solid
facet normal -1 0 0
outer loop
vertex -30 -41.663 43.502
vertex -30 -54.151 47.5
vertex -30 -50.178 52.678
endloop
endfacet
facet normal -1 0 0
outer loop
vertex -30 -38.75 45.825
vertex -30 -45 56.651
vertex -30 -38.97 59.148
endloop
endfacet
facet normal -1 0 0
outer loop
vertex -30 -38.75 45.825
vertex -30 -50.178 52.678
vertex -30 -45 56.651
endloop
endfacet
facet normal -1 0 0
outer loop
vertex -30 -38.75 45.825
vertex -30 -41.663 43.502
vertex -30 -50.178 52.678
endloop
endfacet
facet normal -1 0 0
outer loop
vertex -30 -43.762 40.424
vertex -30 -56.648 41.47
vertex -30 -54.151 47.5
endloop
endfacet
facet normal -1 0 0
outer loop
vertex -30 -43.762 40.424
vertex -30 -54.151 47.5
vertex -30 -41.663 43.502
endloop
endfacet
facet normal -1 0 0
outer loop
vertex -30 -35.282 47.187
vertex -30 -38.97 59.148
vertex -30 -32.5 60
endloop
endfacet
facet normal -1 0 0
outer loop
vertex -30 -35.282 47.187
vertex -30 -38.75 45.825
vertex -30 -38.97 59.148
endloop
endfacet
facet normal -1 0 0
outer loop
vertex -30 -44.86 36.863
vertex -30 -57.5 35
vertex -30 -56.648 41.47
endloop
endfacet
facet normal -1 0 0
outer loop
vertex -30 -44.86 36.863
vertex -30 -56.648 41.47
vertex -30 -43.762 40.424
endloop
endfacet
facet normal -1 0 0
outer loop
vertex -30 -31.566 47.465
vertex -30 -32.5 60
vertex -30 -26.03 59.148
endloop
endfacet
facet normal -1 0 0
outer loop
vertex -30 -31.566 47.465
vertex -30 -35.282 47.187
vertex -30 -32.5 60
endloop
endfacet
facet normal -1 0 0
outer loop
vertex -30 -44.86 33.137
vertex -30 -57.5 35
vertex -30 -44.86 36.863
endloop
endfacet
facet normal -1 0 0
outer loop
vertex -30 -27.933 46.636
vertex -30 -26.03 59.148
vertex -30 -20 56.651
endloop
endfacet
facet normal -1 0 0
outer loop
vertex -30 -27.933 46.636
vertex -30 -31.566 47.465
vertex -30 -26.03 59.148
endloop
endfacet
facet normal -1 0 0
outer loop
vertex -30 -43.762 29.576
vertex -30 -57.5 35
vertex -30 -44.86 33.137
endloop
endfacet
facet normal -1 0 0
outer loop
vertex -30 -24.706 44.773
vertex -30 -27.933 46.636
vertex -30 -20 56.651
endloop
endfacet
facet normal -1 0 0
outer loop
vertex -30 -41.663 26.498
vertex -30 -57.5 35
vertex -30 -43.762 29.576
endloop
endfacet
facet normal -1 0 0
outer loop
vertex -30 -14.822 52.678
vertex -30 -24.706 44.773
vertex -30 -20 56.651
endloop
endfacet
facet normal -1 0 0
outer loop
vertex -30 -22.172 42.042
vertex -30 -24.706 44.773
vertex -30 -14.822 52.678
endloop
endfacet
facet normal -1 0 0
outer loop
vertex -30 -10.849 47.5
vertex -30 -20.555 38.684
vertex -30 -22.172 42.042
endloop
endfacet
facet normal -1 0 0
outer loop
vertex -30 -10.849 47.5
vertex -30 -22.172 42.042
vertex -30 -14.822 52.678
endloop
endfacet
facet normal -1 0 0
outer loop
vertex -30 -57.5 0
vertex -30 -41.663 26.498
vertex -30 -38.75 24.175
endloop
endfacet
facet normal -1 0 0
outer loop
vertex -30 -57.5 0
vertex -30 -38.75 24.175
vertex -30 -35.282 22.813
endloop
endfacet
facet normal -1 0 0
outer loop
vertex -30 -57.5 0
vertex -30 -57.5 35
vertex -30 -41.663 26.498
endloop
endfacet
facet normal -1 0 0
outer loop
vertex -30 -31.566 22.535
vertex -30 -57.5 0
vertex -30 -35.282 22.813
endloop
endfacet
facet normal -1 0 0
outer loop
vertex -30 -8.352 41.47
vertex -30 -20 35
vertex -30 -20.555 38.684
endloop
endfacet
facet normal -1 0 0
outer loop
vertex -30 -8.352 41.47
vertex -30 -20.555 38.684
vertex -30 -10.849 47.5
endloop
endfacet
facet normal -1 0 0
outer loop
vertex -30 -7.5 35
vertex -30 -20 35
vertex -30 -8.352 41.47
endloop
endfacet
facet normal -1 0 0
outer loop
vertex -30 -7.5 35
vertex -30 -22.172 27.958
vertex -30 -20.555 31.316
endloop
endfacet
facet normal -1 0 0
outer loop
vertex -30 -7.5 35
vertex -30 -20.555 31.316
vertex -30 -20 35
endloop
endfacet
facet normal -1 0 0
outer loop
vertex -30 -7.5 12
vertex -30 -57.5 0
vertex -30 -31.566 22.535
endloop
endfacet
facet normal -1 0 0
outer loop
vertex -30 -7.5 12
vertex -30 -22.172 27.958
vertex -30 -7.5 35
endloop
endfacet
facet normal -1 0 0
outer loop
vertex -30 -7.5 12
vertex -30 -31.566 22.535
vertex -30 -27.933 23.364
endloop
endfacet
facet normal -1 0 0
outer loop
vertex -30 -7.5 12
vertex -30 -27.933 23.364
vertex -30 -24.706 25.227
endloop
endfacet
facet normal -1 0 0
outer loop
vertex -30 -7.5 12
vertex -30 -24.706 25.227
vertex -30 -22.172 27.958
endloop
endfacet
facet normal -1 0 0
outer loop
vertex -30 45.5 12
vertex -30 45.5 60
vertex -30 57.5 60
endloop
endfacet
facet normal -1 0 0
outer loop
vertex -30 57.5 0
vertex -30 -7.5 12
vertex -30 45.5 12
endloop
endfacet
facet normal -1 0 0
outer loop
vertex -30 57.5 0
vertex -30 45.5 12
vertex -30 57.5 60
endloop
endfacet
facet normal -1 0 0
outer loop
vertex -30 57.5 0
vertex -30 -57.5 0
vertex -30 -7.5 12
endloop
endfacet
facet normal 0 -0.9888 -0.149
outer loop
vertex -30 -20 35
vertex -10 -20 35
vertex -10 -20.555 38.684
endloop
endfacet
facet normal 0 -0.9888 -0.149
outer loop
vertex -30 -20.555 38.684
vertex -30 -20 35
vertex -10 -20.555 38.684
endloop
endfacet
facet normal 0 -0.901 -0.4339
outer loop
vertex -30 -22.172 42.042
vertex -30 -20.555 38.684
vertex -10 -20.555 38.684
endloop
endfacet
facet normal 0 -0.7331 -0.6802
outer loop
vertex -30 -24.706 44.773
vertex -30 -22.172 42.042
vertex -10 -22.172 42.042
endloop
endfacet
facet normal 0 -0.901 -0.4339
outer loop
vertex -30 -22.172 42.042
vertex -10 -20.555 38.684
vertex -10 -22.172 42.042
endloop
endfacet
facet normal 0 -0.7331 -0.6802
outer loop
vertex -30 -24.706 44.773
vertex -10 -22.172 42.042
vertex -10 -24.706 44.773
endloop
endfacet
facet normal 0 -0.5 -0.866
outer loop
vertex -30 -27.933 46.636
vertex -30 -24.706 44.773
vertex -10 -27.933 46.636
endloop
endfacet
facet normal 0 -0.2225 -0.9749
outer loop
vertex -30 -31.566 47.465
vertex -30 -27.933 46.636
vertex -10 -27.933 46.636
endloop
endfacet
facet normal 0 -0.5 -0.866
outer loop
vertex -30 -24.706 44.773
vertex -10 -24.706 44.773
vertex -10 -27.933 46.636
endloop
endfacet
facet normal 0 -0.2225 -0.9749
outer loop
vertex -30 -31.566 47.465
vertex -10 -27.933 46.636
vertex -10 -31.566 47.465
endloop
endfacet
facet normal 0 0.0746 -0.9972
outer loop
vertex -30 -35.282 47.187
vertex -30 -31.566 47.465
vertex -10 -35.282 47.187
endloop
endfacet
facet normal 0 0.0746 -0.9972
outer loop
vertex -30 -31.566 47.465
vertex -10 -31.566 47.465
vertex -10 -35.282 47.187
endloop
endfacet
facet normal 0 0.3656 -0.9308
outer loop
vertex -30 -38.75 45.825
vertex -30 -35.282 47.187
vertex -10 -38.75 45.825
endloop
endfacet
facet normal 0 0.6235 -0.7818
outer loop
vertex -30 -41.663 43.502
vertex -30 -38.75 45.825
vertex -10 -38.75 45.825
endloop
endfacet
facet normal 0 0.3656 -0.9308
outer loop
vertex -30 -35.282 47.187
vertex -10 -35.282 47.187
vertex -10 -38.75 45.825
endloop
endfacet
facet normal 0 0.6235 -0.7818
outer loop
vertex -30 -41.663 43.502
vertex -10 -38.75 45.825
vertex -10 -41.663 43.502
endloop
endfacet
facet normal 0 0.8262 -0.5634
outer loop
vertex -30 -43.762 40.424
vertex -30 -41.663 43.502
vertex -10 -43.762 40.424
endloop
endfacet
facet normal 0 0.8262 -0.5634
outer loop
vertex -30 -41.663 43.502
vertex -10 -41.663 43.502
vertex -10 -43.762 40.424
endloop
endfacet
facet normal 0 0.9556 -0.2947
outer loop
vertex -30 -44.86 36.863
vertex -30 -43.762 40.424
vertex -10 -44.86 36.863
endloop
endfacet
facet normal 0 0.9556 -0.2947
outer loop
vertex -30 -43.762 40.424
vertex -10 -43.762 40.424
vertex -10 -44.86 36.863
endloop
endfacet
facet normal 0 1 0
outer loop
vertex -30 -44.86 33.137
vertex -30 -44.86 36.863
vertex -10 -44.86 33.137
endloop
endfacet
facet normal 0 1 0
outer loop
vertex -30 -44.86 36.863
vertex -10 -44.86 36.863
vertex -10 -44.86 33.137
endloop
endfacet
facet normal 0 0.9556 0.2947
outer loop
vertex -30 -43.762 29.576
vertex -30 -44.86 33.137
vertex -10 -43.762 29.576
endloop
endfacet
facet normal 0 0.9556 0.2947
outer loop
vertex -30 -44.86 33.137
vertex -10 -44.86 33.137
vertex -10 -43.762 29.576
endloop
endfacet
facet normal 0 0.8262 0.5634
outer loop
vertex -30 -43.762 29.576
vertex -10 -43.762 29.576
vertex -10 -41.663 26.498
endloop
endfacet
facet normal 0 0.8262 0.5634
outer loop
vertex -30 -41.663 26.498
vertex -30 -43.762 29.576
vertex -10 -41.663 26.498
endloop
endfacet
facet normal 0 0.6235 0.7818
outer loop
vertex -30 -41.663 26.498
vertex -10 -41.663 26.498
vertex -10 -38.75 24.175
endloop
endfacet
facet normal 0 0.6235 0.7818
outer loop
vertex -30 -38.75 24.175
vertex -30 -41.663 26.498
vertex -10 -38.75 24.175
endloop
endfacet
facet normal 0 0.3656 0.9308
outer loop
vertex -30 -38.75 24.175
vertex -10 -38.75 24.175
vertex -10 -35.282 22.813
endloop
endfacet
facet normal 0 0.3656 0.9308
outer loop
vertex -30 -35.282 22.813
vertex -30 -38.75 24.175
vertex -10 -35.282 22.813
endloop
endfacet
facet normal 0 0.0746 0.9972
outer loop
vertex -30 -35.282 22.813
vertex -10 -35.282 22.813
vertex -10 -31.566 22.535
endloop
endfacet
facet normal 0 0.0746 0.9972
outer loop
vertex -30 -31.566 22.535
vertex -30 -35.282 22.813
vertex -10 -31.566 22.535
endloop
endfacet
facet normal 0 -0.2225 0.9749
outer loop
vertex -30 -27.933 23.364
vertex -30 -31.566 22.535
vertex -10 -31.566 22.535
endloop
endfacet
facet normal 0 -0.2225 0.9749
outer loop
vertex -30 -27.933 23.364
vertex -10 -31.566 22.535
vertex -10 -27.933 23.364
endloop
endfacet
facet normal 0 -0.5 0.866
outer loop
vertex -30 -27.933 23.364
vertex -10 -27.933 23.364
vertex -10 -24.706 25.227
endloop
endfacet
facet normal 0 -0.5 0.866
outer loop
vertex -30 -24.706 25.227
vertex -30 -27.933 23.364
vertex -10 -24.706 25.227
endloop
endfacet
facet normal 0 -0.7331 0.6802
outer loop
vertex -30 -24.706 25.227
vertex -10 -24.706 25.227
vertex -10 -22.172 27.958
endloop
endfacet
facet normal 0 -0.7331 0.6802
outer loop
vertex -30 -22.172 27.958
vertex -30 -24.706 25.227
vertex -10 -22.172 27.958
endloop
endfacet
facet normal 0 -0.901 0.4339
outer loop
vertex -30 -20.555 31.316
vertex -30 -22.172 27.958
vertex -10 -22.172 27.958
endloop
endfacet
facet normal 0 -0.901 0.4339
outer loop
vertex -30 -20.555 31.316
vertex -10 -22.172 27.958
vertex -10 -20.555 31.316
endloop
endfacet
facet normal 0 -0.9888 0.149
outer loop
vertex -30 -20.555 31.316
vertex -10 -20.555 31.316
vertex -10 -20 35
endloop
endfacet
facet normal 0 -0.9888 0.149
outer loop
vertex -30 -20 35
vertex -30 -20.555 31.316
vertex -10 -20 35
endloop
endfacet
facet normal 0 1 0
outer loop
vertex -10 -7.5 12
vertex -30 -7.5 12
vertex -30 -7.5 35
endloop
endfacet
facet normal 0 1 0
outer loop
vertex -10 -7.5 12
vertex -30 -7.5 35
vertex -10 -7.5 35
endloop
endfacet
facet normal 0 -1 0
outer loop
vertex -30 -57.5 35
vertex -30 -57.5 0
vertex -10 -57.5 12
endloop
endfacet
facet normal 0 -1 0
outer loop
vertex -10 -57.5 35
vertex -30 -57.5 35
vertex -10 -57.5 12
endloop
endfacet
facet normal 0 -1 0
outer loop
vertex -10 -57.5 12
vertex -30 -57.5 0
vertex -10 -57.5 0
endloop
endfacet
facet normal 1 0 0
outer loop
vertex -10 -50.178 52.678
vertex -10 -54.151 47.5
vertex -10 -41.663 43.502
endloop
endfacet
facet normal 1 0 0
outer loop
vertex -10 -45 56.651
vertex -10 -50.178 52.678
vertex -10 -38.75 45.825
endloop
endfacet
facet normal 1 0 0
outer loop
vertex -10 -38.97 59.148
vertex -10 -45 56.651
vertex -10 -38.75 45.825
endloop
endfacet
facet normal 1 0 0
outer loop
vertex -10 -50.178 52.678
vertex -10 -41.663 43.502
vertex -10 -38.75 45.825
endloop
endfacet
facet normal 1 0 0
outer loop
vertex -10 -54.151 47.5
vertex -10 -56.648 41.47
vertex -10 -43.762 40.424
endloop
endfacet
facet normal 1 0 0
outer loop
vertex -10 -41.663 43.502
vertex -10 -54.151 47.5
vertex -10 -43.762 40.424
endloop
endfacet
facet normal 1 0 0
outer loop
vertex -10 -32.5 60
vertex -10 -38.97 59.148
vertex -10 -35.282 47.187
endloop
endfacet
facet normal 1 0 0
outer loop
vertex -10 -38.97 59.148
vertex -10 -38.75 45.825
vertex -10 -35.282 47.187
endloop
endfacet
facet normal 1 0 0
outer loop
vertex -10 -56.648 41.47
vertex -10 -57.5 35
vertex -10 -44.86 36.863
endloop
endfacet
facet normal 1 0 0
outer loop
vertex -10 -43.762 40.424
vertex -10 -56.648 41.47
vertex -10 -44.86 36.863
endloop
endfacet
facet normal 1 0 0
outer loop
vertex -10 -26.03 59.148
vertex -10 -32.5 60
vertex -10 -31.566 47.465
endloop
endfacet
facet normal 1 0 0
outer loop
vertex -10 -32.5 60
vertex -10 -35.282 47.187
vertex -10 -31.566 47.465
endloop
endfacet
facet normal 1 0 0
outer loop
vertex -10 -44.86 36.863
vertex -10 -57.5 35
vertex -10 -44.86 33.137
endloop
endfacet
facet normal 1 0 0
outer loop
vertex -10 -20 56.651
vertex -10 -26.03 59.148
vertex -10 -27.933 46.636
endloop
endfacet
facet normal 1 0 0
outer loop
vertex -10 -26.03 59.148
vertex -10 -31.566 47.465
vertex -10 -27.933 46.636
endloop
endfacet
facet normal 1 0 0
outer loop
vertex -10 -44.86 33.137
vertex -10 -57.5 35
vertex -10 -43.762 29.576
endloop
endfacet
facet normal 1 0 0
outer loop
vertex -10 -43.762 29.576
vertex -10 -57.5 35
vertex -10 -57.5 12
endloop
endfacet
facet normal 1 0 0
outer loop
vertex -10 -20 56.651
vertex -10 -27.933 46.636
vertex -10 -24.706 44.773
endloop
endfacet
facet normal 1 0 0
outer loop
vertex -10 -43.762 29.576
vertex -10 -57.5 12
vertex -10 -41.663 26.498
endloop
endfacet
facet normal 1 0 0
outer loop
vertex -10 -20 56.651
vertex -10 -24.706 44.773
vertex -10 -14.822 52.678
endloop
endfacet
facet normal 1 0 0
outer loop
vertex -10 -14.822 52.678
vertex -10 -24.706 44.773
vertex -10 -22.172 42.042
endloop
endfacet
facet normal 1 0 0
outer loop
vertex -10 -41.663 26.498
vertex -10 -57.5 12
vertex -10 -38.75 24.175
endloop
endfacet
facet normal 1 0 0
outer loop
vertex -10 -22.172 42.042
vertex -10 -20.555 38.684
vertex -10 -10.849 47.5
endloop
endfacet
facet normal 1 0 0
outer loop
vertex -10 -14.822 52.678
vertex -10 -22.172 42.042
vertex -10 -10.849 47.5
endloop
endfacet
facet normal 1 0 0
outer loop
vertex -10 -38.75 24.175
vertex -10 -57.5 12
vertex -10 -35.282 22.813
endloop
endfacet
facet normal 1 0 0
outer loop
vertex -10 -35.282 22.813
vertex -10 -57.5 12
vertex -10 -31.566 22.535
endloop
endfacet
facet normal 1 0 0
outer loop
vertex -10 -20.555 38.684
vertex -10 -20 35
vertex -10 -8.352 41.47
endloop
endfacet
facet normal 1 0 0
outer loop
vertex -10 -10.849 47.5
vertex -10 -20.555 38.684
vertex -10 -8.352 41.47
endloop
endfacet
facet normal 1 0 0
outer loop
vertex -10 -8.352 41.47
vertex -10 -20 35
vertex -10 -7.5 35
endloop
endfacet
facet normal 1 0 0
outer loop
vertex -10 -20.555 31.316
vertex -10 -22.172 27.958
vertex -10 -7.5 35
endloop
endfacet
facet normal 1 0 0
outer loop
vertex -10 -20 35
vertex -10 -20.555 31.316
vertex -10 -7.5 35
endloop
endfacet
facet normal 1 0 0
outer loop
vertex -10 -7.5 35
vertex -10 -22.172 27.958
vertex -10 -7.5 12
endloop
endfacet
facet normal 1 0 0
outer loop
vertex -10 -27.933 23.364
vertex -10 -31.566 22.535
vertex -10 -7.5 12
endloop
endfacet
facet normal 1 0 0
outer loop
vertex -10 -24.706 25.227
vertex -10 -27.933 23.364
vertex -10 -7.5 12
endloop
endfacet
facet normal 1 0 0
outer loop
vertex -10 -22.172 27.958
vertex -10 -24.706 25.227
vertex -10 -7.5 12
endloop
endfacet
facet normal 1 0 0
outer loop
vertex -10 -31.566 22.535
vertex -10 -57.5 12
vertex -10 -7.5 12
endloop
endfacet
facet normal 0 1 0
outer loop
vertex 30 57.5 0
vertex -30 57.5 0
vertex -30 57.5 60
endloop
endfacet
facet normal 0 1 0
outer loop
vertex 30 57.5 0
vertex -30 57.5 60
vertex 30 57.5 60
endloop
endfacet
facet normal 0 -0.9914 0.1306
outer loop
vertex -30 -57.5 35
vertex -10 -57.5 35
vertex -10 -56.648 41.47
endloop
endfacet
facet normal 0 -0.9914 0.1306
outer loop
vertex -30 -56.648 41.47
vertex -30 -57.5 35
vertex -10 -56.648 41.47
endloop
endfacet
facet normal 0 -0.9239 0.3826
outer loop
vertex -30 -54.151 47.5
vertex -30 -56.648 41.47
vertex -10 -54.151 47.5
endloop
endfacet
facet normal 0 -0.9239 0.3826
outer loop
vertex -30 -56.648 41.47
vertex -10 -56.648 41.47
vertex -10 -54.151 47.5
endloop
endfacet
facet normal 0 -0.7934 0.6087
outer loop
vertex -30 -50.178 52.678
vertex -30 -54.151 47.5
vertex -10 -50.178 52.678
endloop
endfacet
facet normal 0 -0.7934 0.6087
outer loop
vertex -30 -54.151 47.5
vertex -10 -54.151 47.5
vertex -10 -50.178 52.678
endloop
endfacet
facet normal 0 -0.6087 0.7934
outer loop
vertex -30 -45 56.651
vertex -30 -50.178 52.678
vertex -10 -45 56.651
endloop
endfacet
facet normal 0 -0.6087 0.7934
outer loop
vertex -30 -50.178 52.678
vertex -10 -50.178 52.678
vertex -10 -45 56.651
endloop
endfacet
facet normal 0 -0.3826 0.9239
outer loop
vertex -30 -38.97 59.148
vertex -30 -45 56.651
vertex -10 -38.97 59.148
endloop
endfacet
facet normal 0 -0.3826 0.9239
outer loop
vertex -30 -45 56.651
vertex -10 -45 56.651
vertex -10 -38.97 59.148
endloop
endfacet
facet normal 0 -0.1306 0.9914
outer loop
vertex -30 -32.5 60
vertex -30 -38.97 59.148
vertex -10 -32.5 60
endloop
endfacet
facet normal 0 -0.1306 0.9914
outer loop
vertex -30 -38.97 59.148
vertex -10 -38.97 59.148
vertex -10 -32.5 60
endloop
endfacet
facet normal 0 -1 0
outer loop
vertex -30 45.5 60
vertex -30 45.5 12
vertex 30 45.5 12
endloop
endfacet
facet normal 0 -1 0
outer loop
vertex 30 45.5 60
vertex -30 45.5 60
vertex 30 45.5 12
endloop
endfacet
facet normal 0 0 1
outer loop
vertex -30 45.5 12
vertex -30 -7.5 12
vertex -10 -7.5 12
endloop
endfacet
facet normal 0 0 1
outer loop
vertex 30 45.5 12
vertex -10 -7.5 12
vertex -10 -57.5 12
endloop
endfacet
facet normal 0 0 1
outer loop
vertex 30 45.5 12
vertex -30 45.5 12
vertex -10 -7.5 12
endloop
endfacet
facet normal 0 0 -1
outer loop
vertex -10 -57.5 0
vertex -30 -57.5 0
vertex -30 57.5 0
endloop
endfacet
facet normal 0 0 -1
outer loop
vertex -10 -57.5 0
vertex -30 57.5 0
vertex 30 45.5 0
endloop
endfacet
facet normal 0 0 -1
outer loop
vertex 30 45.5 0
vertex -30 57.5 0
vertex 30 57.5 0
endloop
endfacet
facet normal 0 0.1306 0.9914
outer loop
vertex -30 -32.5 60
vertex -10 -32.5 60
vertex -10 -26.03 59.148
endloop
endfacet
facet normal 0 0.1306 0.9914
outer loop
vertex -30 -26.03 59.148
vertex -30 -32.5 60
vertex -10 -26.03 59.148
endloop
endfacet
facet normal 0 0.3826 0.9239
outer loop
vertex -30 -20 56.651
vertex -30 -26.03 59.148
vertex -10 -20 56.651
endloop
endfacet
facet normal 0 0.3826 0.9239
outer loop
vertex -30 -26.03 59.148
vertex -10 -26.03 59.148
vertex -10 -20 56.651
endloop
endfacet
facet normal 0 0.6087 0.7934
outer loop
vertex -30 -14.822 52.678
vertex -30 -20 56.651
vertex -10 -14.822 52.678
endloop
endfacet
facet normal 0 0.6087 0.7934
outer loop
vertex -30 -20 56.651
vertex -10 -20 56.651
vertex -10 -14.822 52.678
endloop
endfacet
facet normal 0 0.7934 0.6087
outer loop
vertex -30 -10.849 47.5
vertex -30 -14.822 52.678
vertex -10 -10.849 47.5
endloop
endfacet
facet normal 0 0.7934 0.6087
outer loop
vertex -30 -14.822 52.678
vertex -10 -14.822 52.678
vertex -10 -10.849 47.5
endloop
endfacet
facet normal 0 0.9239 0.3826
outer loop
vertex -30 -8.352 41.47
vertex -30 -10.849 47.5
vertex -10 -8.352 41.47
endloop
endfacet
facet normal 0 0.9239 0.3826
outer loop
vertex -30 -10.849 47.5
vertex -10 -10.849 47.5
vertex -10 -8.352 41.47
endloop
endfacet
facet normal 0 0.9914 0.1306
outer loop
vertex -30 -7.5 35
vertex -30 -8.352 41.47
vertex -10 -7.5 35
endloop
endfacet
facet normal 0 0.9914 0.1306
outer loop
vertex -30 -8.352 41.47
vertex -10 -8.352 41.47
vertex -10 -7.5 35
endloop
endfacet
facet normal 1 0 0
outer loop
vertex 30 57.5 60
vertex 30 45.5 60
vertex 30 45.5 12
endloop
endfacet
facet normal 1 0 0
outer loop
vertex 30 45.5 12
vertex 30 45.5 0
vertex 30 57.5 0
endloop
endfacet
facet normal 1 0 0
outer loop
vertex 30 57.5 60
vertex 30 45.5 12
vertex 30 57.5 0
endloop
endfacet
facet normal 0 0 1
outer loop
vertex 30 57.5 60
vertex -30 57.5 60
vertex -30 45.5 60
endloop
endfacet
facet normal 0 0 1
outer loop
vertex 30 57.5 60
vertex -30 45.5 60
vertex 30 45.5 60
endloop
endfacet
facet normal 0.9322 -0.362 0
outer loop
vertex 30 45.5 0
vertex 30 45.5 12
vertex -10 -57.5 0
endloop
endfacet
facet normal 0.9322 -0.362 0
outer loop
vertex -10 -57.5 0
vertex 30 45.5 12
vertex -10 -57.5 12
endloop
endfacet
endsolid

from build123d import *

# Parameters (mm, degrees)
F0_W      = 60
F0_H      = 115
F1_DEPTH  = 12
F2_W      = 60
F2_H      = 12
F3_DEPTH  = 48
F4_W      = 20
F4_H      = 50
F5_DEPTH  = 48
F6_R      = 12.5
F7_DEPTH  = 20.001
F9_DEPTH  = 20.001
F11_DEPTH = 12.001


with BuildPart() as f1:
    # F0 (on Top) → F1 (new body)
    with BuildSketch(Plane.XY):
        Rectangle(F0_W, F0_H)
    extrude(amount=F1_DEPTH)

    # F2 (on face) → F3 (join)
    with BuildSketch(Plane.XY.offset(12)):
        with Locations((0, 51.5)):
            Rectangle(F2_W, F2_H)
    extrude(amount=F3_DEPTH)

    # F4 (on face) → F5 (join)
    with BuildSketch(Plane.XY.offset(12)):
        with Locations((-20, -32.5)):
            Rectangle(F4_W, F4_H)
    extrude(amount=F5_DEPTH)

    # F6 (on face) → F7 (cut, through all)
    with BuildSketch(Plane.YZ.offset(-10)):
        with Locations((-32.5, 35)):
            Circle(F6_R)
    extrude(amount=-F7_DEPTH, mode=Mode.SUBTRACT)

    # F8 (on face) → F9 (cut, through all)
    with BuildSketch(Plane.YZ.offset(-10)):
        with BuildLine():
            ThreePointArc((-57.5, 35), (-50.17767, 52.67767), (-32.5, 60))
            Line((-32.5, 60), (-57.5, 60))
            Line((-57.5, 60), (-57.5, 35))
        make_face()
        with BuildLine():
            ThreePointArc((-32.5, 60), (-14.82233, 52.67767), (-7.5, 35))
            Line((-7.5, 35), (-7.5, 60))
            Line((-7.5, 60), (-32.5, 60))
        make_face()
    extrude(amount=-F9_DEPTH, mode=Mode.SUBTRACT)

    # F10 (on face) → F11 (cut, through all)
    with BuildSketch(Plane.XY.offset(12)):
        Polygon((30, 45.5), (-10, -57.5), (30, -57.5), align=None)
    extrude(amount=-F11_DEPTH, mode=Mode.SUBTRACT)


solid = f1.part
